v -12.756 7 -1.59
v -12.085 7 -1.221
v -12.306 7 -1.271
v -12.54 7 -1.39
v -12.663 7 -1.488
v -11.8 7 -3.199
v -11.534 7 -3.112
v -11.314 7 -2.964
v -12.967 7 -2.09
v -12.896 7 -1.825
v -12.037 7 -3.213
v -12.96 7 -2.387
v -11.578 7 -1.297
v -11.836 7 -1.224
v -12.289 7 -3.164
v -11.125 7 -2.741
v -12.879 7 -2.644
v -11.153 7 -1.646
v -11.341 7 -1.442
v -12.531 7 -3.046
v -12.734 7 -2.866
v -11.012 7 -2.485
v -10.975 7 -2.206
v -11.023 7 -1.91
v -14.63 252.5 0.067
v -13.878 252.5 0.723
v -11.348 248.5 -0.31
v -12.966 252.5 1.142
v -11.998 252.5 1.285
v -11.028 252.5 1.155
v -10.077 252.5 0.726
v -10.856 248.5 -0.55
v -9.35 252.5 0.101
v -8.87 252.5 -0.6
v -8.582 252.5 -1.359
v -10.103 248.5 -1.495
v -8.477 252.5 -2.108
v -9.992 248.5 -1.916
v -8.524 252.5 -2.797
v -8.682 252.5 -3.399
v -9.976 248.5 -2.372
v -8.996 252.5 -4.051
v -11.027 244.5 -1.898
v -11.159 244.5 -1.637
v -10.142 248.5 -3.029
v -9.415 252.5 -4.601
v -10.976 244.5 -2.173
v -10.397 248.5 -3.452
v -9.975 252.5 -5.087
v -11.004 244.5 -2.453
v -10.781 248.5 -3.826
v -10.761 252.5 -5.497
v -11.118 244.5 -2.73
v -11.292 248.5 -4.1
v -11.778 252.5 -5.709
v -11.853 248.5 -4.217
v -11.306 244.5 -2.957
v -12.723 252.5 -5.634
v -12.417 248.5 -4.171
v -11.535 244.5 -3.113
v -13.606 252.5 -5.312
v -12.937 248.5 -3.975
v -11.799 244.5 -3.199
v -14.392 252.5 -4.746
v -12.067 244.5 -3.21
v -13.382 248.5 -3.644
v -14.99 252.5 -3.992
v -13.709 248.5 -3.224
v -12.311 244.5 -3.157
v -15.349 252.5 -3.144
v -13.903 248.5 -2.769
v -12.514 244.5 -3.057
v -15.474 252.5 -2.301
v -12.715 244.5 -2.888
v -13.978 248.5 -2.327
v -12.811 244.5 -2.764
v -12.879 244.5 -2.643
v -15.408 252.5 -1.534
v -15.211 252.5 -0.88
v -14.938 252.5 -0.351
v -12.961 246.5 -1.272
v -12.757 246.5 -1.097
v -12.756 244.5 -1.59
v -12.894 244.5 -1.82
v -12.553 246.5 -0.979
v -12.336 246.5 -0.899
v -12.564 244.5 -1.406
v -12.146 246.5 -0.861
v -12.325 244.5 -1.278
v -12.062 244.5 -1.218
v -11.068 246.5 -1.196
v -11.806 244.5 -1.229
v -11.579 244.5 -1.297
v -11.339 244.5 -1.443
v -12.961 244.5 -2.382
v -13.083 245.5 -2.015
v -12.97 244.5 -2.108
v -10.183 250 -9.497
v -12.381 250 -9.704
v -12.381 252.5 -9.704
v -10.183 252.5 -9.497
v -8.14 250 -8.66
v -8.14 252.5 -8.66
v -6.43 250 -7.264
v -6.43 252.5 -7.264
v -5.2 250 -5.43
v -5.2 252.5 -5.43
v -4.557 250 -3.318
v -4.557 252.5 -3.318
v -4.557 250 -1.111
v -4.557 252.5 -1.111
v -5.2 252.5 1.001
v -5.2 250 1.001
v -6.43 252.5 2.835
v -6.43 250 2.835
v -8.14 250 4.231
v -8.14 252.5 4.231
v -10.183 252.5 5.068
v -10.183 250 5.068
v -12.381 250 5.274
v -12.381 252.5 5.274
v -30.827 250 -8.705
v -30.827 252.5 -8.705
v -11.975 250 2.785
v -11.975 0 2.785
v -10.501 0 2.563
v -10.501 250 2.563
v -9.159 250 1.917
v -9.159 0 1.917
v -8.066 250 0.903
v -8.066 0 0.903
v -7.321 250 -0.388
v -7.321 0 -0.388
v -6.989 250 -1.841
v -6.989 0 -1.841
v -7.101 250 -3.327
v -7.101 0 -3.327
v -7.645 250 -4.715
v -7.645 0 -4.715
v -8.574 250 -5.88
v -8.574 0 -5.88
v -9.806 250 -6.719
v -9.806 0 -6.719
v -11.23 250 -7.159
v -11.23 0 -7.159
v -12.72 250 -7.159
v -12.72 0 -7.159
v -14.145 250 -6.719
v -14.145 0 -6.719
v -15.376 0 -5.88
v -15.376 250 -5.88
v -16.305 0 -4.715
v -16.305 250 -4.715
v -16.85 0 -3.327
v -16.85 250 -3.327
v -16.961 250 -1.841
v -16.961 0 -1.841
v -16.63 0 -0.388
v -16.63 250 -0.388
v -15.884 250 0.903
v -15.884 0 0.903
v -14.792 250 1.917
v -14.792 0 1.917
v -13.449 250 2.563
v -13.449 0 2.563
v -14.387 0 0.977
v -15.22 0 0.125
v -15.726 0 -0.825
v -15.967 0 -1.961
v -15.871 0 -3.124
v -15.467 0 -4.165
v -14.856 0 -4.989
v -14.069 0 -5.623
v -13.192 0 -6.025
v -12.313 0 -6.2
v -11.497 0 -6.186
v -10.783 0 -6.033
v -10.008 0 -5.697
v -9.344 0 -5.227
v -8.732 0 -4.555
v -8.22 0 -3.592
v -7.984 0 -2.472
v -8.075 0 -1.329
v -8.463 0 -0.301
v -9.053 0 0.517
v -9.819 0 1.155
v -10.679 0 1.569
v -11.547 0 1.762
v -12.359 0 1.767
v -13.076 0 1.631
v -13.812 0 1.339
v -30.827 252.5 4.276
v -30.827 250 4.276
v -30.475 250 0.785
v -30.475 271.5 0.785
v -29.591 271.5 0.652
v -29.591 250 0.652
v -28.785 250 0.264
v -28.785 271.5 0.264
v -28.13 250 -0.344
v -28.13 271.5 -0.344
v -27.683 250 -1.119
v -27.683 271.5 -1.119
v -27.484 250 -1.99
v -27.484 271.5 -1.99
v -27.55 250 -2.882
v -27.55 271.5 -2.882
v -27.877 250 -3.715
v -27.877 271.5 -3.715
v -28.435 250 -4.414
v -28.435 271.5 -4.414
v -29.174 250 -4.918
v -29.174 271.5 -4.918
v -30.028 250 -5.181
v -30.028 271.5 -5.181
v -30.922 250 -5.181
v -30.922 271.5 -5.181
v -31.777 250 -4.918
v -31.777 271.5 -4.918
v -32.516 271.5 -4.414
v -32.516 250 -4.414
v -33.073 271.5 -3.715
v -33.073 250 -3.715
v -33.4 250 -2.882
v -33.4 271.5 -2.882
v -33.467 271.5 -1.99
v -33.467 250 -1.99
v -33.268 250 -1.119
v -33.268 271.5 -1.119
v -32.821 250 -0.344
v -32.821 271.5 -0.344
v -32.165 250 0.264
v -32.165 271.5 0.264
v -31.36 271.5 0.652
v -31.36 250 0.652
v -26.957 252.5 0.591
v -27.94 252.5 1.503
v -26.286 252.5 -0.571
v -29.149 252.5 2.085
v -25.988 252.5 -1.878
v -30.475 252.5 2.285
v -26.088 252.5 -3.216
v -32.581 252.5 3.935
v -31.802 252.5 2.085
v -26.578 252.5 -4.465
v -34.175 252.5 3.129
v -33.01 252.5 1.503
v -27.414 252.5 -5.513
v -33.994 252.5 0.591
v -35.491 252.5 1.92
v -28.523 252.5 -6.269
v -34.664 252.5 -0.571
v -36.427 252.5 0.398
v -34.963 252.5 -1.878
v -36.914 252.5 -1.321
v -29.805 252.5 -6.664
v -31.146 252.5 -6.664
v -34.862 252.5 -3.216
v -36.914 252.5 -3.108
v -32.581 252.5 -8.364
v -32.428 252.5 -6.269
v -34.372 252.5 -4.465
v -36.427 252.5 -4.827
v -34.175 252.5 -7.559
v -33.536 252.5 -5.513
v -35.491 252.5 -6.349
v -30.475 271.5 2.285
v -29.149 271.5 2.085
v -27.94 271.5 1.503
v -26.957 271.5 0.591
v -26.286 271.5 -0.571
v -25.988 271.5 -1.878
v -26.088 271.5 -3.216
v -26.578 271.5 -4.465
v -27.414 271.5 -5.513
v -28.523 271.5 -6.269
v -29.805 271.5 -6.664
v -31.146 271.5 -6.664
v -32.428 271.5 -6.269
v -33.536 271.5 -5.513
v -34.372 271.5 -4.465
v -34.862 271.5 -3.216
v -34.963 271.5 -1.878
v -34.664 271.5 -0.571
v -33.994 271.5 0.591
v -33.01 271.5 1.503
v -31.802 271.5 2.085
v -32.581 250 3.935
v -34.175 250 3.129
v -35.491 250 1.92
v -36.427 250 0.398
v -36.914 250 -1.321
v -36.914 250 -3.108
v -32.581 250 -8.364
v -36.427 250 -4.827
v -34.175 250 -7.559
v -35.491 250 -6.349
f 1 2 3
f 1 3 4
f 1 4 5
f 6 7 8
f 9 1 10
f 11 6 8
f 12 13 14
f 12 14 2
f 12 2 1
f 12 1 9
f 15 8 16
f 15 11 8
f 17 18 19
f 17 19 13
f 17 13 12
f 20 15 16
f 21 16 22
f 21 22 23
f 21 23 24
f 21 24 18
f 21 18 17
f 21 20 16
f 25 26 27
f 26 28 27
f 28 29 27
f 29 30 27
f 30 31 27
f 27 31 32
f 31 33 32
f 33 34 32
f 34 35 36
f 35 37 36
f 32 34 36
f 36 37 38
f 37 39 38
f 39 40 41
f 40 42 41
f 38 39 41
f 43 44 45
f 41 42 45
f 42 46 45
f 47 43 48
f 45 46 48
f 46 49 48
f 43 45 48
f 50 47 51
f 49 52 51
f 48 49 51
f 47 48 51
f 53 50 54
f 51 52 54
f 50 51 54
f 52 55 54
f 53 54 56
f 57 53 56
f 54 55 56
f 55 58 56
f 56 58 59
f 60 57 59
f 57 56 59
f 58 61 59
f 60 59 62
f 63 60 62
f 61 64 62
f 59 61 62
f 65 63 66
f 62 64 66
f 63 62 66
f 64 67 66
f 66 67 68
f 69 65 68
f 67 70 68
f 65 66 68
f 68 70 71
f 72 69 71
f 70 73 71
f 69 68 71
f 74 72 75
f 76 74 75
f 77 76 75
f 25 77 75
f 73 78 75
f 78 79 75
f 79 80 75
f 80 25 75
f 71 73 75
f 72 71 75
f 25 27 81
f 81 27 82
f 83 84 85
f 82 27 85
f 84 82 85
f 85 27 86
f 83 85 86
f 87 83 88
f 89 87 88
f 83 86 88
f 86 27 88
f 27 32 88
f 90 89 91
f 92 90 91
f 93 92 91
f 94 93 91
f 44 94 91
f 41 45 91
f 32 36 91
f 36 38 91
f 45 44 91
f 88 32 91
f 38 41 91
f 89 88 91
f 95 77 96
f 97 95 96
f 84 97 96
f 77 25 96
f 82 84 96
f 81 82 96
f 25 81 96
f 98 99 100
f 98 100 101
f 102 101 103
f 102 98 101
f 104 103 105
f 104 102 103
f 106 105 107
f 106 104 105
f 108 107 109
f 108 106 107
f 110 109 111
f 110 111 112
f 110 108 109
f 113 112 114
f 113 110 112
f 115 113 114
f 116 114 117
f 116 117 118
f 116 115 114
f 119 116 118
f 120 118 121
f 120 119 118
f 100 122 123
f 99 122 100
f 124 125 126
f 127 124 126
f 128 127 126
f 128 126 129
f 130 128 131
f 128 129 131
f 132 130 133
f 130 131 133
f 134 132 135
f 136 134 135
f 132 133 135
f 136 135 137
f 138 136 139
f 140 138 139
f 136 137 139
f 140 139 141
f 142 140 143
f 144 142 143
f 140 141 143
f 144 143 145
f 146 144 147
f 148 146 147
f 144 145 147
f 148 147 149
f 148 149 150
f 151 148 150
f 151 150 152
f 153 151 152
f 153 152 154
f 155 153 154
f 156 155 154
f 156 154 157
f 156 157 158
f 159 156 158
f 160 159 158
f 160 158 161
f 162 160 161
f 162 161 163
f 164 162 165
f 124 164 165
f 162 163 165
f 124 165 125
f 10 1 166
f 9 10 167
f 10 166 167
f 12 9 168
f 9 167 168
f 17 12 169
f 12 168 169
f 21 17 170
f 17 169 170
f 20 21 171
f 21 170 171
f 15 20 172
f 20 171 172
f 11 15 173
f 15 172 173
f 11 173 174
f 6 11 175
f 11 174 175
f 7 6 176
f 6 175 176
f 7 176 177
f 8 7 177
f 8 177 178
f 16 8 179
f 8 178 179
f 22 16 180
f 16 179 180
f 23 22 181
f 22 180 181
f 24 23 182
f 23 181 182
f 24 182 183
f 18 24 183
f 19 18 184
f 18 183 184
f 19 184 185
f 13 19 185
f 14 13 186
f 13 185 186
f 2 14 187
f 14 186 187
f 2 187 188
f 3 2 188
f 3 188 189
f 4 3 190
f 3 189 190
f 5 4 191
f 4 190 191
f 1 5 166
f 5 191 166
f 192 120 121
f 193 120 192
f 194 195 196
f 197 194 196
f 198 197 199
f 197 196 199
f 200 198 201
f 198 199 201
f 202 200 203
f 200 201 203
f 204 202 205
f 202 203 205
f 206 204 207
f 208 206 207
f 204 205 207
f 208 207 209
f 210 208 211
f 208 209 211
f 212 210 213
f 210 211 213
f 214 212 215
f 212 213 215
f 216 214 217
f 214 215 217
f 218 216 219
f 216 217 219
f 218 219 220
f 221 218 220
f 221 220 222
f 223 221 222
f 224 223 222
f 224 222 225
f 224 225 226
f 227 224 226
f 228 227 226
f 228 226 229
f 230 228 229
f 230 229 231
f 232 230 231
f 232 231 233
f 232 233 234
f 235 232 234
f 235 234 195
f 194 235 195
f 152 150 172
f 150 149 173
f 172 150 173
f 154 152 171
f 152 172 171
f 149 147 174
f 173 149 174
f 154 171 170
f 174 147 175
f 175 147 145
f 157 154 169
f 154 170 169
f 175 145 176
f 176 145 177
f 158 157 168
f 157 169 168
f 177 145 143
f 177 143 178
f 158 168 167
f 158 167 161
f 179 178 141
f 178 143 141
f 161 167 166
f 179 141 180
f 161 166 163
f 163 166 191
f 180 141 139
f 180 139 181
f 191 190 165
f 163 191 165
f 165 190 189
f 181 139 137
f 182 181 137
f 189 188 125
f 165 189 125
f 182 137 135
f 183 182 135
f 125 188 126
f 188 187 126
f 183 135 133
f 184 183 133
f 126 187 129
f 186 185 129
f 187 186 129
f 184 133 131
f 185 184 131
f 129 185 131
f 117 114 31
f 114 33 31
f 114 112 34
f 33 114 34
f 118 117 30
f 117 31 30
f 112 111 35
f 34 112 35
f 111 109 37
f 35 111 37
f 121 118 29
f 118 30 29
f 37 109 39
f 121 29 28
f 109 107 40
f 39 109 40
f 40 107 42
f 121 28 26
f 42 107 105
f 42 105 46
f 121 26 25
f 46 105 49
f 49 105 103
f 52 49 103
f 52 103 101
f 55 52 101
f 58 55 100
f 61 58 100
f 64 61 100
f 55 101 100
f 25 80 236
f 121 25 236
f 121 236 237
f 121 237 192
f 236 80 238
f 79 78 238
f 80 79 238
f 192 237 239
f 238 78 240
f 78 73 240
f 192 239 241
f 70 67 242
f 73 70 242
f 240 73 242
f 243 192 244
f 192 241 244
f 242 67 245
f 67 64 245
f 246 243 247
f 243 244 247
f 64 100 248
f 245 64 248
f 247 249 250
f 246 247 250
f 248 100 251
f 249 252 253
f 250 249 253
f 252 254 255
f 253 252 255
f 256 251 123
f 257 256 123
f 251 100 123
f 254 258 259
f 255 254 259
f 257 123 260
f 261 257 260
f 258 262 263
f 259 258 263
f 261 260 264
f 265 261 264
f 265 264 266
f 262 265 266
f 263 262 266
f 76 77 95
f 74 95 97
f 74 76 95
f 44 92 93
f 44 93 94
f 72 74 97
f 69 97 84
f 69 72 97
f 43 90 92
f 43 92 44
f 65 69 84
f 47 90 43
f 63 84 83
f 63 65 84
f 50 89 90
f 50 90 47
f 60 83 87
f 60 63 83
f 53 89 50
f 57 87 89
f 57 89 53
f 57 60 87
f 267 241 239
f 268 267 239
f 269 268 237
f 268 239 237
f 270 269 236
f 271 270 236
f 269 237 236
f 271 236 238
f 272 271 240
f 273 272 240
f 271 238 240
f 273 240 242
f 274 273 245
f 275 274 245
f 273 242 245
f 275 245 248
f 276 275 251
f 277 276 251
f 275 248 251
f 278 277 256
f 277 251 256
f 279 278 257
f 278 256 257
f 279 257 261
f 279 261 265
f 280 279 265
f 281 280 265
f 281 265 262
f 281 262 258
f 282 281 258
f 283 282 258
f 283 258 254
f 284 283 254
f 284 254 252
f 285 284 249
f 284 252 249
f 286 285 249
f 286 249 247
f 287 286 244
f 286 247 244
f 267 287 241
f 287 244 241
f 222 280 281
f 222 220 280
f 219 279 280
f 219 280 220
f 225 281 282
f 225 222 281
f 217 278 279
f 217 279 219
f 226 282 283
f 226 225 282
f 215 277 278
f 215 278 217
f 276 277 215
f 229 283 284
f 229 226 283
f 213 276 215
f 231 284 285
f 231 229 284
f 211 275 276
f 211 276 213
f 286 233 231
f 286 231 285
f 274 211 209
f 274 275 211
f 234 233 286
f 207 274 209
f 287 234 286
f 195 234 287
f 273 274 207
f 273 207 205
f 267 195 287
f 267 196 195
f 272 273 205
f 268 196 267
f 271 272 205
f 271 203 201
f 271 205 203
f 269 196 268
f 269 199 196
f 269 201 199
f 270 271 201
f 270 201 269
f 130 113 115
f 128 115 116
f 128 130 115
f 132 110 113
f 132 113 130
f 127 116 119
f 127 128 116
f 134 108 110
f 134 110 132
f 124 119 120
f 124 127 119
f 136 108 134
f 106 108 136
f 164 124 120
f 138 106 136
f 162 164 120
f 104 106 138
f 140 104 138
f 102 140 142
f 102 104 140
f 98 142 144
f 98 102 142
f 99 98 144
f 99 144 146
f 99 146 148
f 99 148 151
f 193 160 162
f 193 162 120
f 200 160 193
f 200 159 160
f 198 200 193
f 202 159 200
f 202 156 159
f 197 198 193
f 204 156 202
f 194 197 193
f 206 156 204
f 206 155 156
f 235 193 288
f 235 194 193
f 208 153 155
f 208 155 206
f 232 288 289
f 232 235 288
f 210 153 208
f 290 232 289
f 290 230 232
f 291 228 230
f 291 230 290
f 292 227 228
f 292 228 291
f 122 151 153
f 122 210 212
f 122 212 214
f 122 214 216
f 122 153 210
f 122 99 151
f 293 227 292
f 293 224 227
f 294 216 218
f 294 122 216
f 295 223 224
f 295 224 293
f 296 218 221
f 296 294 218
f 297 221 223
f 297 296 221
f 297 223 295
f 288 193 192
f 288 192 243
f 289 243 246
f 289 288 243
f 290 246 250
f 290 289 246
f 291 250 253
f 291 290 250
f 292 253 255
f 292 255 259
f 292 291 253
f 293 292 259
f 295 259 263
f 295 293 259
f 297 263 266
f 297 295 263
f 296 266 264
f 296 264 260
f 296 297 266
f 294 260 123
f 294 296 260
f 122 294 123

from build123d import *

# Parameters (mm, degrees)
CROQUIS2_R              = 5
SALIENTE_EXTRUIR1_DEPTH = 250
SALIENTE_EXTRUIR2_DEPTH = 2.5
CROQUIS11_R             = 4.5
SALIENTE_EXTRUIR3_DEPTH = 19
CORTAR_EXTRUIR1_REACH   = 276.178
CROQUIS12_R             = 3


with BuildPart() as part:
    # Croquis2 → Saliente-Extruir1 (new body)
    with BuildSketch(Plane(origin=(0, 0, 0), x_dir=(1, 0, 0), z_dir=(0, 1, 0))):
        with Locations(Location((-11.975261547, 2.214603163, 0), (0, 0, 270))):
            Circle(CROQUIS2_R)
    extrude(amount=SALIENTE_EXTRUIR1_DEPTH)

    # Cortar-Recubrir1: read off the stored shape, not the designer's step
    # Cortar-Recubrir1: loft between two sections, ruled curve by curve
    cortar_recubrir1_from = [
        Edge.make_bspline([(-12.756084652, 7, -1.589850989), (-14.005589, 7, -3.151497198), (-12.443942791, 7, -4.401001547), (-11.194438443, 7, -2.839355337), (-9.944934094, 7, -1.277709127), (-11.506580304, 7, -0.028204779), (-12.756084652, 7, -1.589850989)], [0, 0, 0, 0, 0.5, 0.5, 0.5, 1, 1, 1, 1], 3, [1, 0.333333333, 0.333333333, 1, 0.333333333, 0.333333333, 1]),
    ]
    cortar_recubrir1_to = [
        Edge.make_bspline([(-14.386979714, 0, 0.976574595), (-20.76933523, 0, -3.846861738), (-15.945898897, 0, -10.229217255), (-9.563543381, 0, -5.405780921), (-3.181187864, 0, -0.582344588), (-8.004624198, 0, 5.800010929), (-14.386979714, 0, 0.976574595)], [0, 0, 0, 0, 0.5, 0.5, 0.5, 1, 1, 1, 1], 3, [1, 0.333333333, 0.333333333, 1, 0.333333333, 0.333333333, 1]),
    ]
    cortar_recubrir1 = Solid(Shell([*[Face.make_surface_from_curves(cortar_recubrir1_from[k], cortar_recubrir1_to[k]) for k in range(1)], Face(Wire(cortar_recubrir1_from)), Face(Wire(cortar_recubrir1_to))]))
    add(cortar_recubrir1, mode=Mode.SUBTRACT)

    # Croquis7 → Saliente-Extruir2 (add)
    with BuildSketch(Plane(origin=(0, 250, 0), x_dir=(1, 0, 0), z_dir=(0, 1, 0))):
        with BuildLine():
            Line((-30.826612899, 8.705100234), (-12.380666953, 9.703638245))
            ThreePointArc((-12.380666953, 9.703638245), (-4.475261547, 2.214603163), (-12.380666953, -5.274431919))
            Line((-12.380666953, -5.274431919), (-30.826612899, -4.275893908))
            ThreePointArc((-30.826612899, -4.275893908), (-36.975261547, 2.214603163), (-30.826612899, 8.705100234))
        make_face()
    extrude(amount=SALIENTE_EXTRUIR2_DEPTH)

    # Cortar-Recubrir2: read off the stored shape, not the designer's step
    # Cortar-Recubrir2: loft between two sections, ruled curve by curve
    cortar_recubrir2_from = [
        Edge.make_bspline([(-12.878746512, 244.5, -2.643222947), (-13.735986079, 244.5, -0.836253018), (-11.92901615, 244.5, 0.02098655), (-11.071776583, 244.5, -1.785983379), (-10.214537015, 244.5, -3.592953308), (-12.021506944, 244.5, -4.450192876), (-12.878746512, 244.5, -2.643222947)], [0, 0, 0, 0, 0.5, 0.5, 0.5, 1, 1, 1, 1], 3, [1, 0.333333333, 0.333333333, 1, 0.333333333, 0.333333333, 1]),
    ]
    cortar_recubrir2_to = [
        Edge.make_bspline([(-14.629528251, 252.5, 0.066814876), (-10.066692174, 252.5, 5.375348283), (-4.758158767, 252.5, 0.812512206), (-9.320994844, 252.5, -4.496021201), (-13.883830921, 252.5, -9.804554608), (-19.192364328, 252.5, -5.241718531), (-14.629528251, 252.5, 0.066814876)], [0, 0, 0, 0, 0.5, 0.5, 0.5, 1, 1, 1, 1], 3, [1, 0.333333333, 0.333333333, 1, 0.333333333, 0.333333333, 1]),
    ]
    cortar_recubrir2 = Solid(Shell([*[Face.make_surface_from_curves(cortar_recubrir2_from[k], cortar_recubrir2_to[k]) for k in range(1)], Face(Wire(cortar_recubrir2_from)), Face(Wire(cortar_recubrir2_to))]))
    add(cortar_recubrir2, mode=Mode.SUBTRACT)

    # Croquis11 → Saliente-Extruir3 (add)
    with BuildSketch(Plane(origin=(0, 252.5, 0), x_dir=(1, 0, 0), z_dir=(0, 1, 0))):
        with Locations(Location((-30.475261547, 2.214603163, 0), (0, 0, 270))):
            Circle(CROQUIS11_R)
    extrude(amount=SALIENTE_EXTRUIR3_DEPTH)

    # Croquis12 → Cortar-Extruir1 (cut, up to next)
    with BuildSketch(Plane(origin=(0, 271.5, 0), x_dir=(1, 0, 0), z_dir=(0, 1, 0)), mode=Mode.PRIVATE) as cortar_extruir1_sk1:
        with Locations(Location((-30.475261547, 2.214603163, 0), (0, 0, 270))):
            Circle(CROQUIS12_R)
    cortar_extruir1_tool1 = extrude(cortar_extruir1_sk1.sketch, amount=-CORTAR_EXTRUIR1_REACH, mode=Mode.PRIVATE) & part.part
    add(cortar_extruir1_tool1.solids().sort_by_distance((-30.475262, 271.5, -2.214603))[0], mode=Mode.SUBTRACT)


solid = part.part
